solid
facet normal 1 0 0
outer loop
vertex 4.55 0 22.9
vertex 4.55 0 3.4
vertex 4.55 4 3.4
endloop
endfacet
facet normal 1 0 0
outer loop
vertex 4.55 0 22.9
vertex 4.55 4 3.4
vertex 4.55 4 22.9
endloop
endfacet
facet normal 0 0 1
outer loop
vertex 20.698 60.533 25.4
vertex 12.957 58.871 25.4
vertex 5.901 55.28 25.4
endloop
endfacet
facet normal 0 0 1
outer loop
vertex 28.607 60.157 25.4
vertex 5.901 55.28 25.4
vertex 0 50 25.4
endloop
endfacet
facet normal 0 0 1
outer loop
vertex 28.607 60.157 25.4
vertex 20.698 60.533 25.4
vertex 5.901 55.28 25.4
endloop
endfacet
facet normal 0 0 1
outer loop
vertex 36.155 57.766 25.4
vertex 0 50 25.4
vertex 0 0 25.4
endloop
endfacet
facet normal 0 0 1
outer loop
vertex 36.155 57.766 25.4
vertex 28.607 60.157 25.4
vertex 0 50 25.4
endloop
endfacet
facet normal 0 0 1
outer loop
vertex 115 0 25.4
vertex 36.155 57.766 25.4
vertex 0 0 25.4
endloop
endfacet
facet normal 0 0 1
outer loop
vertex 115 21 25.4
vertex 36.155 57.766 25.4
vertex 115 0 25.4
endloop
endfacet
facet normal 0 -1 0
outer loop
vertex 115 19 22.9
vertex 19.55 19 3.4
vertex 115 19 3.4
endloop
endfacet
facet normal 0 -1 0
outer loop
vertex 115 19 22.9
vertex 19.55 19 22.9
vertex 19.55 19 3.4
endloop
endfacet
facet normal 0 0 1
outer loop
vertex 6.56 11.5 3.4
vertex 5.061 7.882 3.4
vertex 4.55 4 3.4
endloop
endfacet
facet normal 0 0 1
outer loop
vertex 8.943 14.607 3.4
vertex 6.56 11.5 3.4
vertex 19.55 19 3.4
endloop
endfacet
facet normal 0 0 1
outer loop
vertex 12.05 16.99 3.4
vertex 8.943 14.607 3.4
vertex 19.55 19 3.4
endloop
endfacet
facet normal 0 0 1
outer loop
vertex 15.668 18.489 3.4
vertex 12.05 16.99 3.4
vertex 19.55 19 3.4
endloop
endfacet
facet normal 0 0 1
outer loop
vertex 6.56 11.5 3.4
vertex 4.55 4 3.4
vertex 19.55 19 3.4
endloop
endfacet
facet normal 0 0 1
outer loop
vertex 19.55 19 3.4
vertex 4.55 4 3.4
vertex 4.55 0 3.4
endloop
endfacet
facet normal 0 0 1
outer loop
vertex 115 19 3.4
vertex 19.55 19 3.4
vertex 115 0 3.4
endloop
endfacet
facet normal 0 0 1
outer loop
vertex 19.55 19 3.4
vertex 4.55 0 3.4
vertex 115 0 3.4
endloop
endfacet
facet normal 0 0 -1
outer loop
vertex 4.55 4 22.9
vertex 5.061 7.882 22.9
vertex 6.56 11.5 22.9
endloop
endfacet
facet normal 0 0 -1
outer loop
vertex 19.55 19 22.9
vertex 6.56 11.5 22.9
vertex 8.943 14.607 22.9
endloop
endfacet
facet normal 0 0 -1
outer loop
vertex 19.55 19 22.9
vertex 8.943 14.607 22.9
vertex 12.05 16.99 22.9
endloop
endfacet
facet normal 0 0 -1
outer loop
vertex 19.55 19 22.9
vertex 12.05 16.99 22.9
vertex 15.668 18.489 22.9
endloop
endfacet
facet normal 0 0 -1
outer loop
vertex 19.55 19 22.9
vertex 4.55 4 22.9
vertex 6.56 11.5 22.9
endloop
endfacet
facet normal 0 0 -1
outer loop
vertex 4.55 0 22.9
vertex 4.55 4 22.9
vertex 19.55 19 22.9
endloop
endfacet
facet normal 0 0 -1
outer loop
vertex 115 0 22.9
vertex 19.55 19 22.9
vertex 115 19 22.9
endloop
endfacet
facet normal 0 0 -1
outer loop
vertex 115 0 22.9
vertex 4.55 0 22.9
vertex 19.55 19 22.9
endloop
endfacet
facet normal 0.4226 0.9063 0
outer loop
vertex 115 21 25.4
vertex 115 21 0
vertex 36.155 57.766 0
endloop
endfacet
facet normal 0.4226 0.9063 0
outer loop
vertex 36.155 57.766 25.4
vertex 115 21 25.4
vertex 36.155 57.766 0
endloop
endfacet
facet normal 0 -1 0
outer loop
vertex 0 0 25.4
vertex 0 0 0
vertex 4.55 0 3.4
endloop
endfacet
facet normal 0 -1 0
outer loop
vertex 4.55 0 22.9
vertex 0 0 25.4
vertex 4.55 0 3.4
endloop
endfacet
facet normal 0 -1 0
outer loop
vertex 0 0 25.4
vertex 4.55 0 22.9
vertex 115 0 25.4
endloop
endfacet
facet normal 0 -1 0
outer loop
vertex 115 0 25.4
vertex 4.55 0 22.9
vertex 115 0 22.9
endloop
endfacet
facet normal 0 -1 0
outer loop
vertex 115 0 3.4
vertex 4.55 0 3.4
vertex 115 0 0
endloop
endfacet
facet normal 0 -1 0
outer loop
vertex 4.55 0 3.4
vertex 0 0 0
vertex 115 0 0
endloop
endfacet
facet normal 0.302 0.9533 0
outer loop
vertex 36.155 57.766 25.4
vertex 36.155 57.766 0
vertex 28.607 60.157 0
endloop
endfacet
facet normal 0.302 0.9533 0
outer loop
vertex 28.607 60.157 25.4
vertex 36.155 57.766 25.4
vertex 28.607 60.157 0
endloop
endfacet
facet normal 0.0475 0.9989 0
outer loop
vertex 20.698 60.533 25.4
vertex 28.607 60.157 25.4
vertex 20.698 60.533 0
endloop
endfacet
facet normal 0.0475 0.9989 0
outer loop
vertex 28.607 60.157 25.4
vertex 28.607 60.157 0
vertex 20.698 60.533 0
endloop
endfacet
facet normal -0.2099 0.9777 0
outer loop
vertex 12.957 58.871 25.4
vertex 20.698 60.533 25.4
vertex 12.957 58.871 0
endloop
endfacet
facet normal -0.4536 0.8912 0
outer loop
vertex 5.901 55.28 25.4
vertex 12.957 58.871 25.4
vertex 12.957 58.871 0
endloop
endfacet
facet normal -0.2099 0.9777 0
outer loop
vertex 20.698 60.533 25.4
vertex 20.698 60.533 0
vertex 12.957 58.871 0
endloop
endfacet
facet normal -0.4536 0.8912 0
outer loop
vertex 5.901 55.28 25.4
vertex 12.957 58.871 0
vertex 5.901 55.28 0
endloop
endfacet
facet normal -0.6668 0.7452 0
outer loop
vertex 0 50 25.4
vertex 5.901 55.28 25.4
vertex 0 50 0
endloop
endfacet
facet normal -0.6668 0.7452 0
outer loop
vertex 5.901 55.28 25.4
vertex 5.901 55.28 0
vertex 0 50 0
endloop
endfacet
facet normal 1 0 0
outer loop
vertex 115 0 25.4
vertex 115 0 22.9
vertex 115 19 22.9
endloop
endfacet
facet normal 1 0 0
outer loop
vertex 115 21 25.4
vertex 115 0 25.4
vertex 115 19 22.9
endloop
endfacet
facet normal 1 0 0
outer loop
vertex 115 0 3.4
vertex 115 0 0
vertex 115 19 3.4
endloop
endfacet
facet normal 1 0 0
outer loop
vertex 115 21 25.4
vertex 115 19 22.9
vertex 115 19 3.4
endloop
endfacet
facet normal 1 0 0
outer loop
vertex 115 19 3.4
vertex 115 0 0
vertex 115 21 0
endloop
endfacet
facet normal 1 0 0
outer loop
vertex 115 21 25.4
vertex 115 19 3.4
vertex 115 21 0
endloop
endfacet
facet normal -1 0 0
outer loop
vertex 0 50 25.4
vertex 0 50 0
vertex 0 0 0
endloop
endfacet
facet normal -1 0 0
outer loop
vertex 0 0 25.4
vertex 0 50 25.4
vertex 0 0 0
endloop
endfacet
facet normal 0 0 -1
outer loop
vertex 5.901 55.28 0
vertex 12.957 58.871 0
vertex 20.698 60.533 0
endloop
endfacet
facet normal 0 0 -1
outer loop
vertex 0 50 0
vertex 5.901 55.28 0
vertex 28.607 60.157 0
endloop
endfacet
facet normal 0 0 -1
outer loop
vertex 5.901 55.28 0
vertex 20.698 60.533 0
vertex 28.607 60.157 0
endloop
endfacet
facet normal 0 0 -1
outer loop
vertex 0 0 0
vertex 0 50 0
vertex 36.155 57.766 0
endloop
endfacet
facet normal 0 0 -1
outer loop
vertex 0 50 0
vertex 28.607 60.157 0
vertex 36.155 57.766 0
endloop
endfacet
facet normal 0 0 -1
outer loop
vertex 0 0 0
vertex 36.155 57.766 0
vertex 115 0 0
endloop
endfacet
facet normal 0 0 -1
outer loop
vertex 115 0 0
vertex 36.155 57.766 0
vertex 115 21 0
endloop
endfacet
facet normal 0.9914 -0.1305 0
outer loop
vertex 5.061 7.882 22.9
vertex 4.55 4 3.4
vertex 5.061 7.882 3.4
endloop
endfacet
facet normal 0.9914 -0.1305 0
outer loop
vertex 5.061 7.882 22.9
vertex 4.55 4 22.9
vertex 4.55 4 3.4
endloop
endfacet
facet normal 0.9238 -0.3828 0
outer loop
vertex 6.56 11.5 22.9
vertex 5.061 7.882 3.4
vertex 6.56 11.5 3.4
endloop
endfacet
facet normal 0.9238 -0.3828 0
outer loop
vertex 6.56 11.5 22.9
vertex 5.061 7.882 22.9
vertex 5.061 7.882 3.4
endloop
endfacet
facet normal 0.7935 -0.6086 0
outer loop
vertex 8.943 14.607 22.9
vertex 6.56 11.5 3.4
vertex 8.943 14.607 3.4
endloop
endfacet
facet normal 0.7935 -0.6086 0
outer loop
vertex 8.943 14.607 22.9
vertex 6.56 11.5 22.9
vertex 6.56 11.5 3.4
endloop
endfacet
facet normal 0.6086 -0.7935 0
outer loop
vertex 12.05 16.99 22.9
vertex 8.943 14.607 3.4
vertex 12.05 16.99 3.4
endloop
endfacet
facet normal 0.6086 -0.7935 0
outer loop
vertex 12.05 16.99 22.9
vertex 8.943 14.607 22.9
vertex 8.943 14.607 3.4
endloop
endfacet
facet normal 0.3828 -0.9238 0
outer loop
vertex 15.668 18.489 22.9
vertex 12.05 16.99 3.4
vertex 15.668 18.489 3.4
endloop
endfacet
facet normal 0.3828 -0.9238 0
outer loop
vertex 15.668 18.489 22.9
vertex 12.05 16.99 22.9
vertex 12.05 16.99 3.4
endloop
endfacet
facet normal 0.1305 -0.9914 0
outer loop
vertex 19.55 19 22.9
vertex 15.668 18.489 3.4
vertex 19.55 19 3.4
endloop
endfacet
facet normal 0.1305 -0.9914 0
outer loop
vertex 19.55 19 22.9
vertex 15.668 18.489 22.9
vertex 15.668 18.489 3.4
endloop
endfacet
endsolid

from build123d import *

# Parameters (mm, degrees)
F1_DEPTH = 25.4
F2_W     = 110.45
F2_H     = 19.5
F3_DEPTH = 19
F4_R     = 15


with BuildPart() as f1:
    # F0 (on Top) → F1 (new body)
    with BuildSketch(Plane.XY):
        with BuildLine():
            Line((0, 50), (0, 0))
            Line((0, 0), (115, 0))
            Line((115, 0), (115, 21))
            Line((115, 21), (36.155032, 57.766013))
            ThreePointArc((36.155032, 57.766013), (16.773652, 59.953206), (0, 50))
        make_face()
    extrude(amount=F1_DEPTH)

    # F2 (on face) → F3 (cut)
    with BuildSketch(Plane.XZ):
        with Locations((59.775, 13.15)):
            Rectangle(F2_W, F2_H)
    extrude(amount=-F3_DEPTH, mode=Mode.SUBTRACT)

    # F4
    f4_edges = [f1.edges().sort_by_distance(p)[0] for p in [
        (4.55, 19, 13.15),
    ]]
    fillet(f4_edges, radius=F4_R)


solid = f1.part
